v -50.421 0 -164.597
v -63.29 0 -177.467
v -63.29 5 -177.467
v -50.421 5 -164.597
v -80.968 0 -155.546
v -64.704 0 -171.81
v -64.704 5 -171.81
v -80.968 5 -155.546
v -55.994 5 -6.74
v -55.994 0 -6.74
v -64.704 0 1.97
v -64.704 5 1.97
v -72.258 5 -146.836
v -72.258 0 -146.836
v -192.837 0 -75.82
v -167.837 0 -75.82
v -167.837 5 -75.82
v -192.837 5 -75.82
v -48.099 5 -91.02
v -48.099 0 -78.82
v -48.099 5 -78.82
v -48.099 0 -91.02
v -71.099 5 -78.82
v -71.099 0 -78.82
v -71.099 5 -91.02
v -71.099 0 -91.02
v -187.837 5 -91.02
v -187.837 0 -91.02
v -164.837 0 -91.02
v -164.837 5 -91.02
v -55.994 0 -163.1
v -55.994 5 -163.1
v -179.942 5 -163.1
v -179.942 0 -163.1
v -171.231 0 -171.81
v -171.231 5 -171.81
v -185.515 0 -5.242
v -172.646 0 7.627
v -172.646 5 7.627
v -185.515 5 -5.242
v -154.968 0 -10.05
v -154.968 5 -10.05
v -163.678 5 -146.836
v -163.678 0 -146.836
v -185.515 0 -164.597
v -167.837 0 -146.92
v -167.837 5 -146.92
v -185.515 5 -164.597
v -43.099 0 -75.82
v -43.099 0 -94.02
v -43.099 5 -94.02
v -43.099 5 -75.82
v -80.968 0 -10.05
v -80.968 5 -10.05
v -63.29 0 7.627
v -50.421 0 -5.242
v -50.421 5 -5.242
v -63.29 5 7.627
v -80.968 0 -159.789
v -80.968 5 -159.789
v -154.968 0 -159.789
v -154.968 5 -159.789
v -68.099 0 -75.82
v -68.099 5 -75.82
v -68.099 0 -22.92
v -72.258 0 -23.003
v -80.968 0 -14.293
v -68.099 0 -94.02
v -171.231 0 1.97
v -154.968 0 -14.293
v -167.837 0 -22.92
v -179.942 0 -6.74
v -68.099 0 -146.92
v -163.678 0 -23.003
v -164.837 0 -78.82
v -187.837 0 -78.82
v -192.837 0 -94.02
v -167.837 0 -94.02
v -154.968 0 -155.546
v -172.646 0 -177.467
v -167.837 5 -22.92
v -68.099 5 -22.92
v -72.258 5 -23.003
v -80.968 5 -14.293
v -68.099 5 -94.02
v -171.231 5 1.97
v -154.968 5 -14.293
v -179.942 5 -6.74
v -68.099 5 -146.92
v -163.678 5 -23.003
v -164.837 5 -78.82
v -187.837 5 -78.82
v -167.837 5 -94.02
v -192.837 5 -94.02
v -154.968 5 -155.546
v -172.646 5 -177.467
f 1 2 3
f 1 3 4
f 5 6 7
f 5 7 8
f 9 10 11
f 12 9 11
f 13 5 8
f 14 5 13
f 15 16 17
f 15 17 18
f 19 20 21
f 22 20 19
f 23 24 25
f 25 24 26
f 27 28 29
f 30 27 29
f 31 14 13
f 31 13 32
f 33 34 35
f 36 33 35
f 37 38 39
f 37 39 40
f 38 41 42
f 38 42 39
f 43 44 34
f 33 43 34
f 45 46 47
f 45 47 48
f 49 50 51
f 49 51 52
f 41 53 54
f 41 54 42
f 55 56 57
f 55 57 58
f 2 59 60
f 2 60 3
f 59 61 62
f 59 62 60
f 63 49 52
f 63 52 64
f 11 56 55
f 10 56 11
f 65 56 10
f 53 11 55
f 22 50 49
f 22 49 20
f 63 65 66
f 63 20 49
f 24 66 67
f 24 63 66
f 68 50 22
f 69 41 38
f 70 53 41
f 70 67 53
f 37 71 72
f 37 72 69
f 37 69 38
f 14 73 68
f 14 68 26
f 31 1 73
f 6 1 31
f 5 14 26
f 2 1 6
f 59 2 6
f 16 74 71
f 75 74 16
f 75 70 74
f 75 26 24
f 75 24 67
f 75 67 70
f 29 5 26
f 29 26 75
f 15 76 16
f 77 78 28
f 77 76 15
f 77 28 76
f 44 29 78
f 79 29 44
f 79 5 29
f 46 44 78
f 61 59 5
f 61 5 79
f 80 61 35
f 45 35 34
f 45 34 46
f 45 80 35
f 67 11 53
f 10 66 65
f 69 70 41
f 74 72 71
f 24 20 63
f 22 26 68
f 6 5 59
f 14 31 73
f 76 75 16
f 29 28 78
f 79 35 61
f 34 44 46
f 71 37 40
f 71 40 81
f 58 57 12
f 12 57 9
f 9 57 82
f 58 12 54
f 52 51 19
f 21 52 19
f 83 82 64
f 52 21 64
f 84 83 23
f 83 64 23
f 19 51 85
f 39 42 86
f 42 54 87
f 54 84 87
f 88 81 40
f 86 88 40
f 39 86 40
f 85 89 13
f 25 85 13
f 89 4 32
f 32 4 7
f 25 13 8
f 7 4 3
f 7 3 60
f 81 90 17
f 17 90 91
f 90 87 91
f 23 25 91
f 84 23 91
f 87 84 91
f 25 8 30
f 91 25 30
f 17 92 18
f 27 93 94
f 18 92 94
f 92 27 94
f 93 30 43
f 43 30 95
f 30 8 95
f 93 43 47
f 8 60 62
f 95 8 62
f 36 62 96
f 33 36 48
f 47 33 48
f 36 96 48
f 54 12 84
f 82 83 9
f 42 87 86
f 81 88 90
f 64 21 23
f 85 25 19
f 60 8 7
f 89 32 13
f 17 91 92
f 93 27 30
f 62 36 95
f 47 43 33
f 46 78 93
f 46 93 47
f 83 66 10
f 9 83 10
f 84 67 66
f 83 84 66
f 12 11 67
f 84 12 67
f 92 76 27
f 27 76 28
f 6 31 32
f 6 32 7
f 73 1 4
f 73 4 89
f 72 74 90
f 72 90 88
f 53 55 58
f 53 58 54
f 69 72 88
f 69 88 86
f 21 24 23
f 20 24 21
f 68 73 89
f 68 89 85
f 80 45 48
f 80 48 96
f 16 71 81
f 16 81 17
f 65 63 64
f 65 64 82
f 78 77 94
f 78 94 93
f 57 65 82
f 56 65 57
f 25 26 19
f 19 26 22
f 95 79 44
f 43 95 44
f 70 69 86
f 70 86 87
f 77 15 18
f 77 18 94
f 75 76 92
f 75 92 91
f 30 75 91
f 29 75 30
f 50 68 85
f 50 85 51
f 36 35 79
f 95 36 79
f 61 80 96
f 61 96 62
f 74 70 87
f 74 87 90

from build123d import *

# Parameters (mm, degrees)
SKETCH2_W           = 23
SKETCH2_H           = 12.2
BOSS_EXTRUDE1_DEPTH = 5


with BuildPart() as part:
    # Sketch2 → Boss-Extrude1 (new body)
    with BuildSketch(Plane(origin=(0, 0, 0), x_dir=(1, 0, 0), z_dir=(0, 1, 0))):
        Polygon((-154.967912227, 159.789086559), (-80.967912227, 159.789086559), (-63.290242697, 177.466756088), (-50.420899279, 164.597412671), (-68.098568809, 146.919743141), (-68.098568809, 94.019743141), (-43.098568809, 94.019743141), (-43.098568809, 75.819743141), (-68.098568809, 75.819743141), (-68.098568809, 22.919743141), (-50.420899279, 5.242073612), (-63.290242697, -7.627269806), (-80.967912227, 10.050399724), (-154.967912227, 10.050399724), (-172.645581756, -7.627269806), (-185.514925174, 5.242073612), (-167.837255644, 22.919743141), (-167.837255644, 75.819743141), (-192.837255644, 75.819743141), (-192.837255644, 94.019743141), (-167.837255644, 94.019743141), (-167.837255644, 146.919743141), (-185.514925174, 164.597412671), (-172.645581756, 177.466756088), align=None)
        Polygon((-171.231368194, 171.809901839), (-154.967912227, 155.546445872), (-163.678194925, 146.836163173), (-179.941650892, 163.099619141), align=None, mode=Mode.SUBTRACT)
        with Locations((-176.337255644, 84.919743141)):
            Rectangle(SKETCH2_W, SKETCH2_H, mode=Mode.SUBTRACT)
        Polygon((-80.967912227, 155.546445872), (-72.257629528, 146.836163173), (-55.994173561, 163.099619141), (-64.704456259, 171.809901839), align=None, mode=Mode.SUBTRACT)
        Polygon((-64.704456259, -1.970415557), (-80.967912227, 14.293040411), (-72.257629528, 23.003323109), (-55.994173561, 6.739867142), align=None, mode=Mode.SUBTRACT)
        Polygon((-154.967912227, 14.293040411), (-163.678194925, 23.003323109), (-179.941650892, 6.739867142), (-171.231368194, -1.970415557), align=None, mode=Mode.SUBTRACT)
        with Locations((-59.598568809, 84.919743141)):
            Rectangle(SKETCH2_W, SKETCH2_H, mode=Mode.SUBTRACT)
    extrude(amount=BOSS_EXTRUDE1_DEPTH)


solid = part.part
